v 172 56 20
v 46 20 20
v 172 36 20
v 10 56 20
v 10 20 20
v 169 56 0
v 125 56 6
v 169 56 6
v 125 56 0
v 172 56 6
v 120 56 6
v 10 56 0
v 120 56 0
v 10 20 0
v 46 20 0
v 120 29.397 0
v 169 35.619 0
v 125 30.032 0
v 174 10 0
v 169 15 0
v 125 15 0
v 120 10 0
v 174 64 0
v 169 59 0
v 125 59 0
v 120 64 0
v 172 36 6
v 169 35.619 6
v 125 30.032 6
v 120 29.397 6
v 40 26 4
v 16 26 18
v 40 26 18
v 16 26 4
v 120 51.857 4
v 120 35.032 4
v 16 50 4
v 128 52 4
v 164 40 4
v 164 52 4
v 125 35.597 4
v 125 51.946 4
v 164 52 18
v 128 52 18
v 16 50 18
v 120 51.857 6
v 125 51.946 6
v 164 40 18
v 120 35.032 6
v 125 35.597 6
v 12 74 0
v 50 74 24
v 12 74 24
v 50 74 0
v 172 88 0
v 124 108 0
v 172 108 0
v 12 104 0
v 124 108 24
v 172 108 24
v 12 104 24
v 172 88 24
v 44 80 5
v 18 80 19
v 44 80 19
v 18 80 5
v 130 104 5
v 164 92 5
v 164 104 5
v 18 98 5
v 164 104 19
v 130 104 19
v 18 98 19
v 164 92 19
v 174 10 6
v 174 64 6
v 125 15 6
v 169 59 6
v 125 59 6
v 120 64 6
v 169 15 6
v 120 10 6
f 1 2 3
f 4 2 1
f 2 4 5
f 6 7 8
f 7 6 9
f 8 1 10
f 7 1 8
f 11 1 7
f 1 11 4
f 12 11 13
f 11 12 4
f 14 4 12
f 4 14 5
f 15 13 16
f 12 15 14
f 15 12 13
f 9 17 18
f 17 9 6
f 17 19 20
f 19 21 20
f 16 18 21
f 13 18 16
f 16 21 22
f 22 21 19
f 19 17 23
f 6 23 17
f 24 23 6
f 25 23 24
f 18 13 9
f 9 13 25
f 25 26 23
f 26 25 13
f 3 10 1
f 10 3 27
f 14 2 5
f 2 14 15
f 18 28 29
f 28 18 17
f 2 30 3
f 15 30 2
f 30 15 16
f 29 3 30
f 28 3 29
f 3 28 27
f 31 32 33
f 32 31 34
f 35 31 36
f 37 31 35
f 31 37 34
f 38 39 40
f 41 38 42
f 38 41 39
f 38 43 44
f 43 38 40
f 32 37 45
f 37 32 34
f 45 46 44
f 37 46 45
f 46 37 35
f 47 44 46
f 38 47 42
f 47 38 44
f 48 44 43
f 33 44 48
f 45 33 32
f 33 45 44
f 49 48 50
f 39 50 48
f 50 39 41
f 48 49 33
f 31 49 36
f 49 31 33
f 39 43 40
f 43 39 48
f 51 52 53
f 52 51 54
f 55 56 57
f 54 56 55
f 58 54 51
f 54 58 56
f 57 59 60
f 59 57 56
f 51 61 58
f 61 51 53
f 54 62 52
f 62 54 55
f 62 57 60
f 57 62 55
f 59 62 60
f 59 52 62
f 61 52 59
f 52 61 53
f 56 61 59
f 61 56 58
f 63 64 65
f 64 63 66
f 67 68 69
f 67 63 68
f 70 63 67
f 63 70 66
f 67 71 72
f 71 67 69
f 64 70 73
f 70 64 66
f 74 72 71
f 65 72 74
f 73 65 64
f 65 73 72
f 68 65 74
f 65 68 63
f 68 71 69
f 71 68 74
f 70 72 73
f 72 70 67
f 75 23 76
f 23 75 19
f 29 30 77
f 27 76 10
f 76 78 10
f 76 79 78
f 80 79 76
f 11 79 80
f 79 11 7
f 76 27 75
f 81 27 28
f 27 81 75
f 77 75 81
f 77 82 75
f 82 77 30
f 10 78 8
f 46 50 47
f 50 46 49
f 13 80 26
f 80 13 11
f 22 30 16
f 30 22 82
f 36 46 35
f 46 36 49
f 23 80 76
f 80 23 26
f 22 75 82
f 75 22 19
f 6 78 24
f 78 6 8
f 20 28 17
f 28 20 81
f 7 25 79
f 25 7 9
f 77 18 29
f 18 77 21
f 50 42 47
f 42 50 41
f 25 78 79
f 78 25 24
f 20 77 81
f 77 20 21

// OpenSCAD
// file: ../../f1_1/cad/common.scad
// Shared constants and primitives for F1.1 mechanical design.

filament_diameter = 1.75;
ptfe_inner_diameter = 2.0;
mount_hole_diameter = 3.2;
mount_slot_width = 3.5;
mount_slot_length = 10.0;

module rounded_block(size_vec, radius = 2) {
    x = size_vec[0];
    y = size_vec[1];
    z = size_vec[2];

    minkowski() {
        cube([x - (2 * radius), y - (2 * radius), z - (2 * radius)], center = false);
        sphere(r = radius, $fn = 24);
    }
}

module m3_hole(height = 12, diameter = mount_hole_diameter) {
    cylinder(h = height, d = diameter, center = false, $fn = 32);
}

module slot_hole(length = mount_slot_length, width = mount_slot_width, height = 8) {
    hull() {
        translate([0, 0, 0]) {
            cylinder(h = height, d = width, center = false, $fn = 24);
        }
        translate([length, 0, 0]) {
            cylinder(h = height, d = width, center = false, $fn = 24);
        }
    }
}

module filament_channel(length = 30, diameter = ptfe_inner_diameter, axis = "x") {
    if (axis == "x") {
        rotate([0, 90, 0]) {
            cylinder(h = length, d = diameter, center = true, $fn = 36);
        }
    } else if (axis == "y") {
        rotate([90, 0, 0]) {
            cylinder(h = length, d = diameter, center = true, $fn = 36);
        }
    } else {
        cylinder(h = length, d = diameter, center = true, $fn = 36);
    }
}

module pc4_m6_fitting_port() {
    difference() {
        cylinder(h = 8, d = 8, center = false, $fn = 24);
        translate([0, 0, -0.5]) {
            cylinder(h = 9, d = 4.6, center = false, $fn = 24);
        }
    }
}

module modular_rail(width = 80, depth = 12, length = 210) {
    difference() {
        cube([length, width, depth], center = false);

        for (slot_x = [15 : 20 : length - 15]) {
            translate([slot_x, width * 0.5, 0]) {
                slot_hole(length = mount_slot_length, width = mount_slot_width, height = depth + 1);
            }
        }
    }
}
// main file
use <../../f1_1/cad/common.scad>;

// Cooling and heater exhaust ducting with optional HEPA frame mount.

hepa_enabled = true;

module fan_to_splice_duct() {
    difference() {
        hull() {
            translate([10, 20, 0]) {
                cube([36, 36, 20], center = false);
            }
            translate([120, 36, 0]) {
                cube([52, 20, 20], center = false);
            }
        }

        hull() {
            translate([16, 26, 4]) {
                cube([24, 24, 14], center = false);
            }
            translate([128, 40, 4]) {
                cube([36, 12, 14], center = false);
            }
        }
    }
}

module heater_exhaust_duct() {
    difference() {
        hull() {
            translate([12, 74, 0]) {
                cube([38, 30, 24], center = false);
            }
            translate([124, 88, 0]) {
                cube([48, 20, 24], center = false);
            }
        }

        hull() {
            translate([18, 80, 5]) {
                cube([26, 18, 14], center = false);
            }
            translate([130, 92, 5]) {
                cube([34, 12, 14], center = false);
            }
        }
    }
}

module hepa_frame() {
    difference() {
        cube([54, 54, 6], center = false);
        translate([5, 5, -0.1]) {
            cube([44, 44, 6.2], center = false);
        }

        for (x = [7, 47]) {
            for (y = [7, 47]) {
                translate([x, y, -0.1]) {
                    m3_hole(height = 6.2);
                }
            }
        }
    }
}

module vent_layout() {
    fan_to_splice_duct();
    heater_exhaust_duct();

    if (hepa_enabled) {
        translate([120, 10, 0]) {
            hepa_frame();
        }
    }
}

vent_layout();
